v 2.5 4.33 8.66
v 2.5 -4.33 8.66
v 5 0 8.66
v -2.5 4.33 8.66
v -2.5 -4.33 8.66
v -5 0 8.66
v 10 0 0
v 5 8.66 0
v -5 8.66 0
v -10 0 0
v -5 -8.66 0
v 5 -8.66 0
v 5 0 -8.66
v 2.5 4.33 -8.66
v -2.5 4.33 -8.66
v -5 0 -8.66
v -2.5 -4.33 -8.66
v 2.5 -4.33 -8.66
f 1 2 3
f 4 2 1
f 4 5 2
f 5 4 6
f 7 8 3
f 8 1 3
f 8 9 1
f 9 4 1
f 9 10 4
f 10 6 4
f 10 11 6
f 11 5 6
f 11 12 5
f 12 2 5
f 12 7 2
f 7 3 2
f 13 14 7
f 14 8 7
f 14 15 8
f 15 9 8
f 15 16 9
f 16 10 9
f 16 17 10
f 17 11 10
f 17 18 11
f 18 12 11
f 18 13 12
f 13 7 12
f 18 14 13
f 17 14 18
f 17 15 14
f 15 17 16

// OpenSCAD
//Author: Chris Correll
//Date: 9/13/2022
//Description: Lesson 1-3 Smoothing curves with $fn, short lesson.
//reading: https://en.wikibooks.org/wiki/OpenSCAD_User_Manual/Other_Language_Features#.24fa.2C_.24fs_and_.24fn

$fn = 6; //resolution number of fragments in a 360 degree horizontal cross section number of sides of a sphere is (approx) given by = fn * floor((fn-1)/2)+2 
sphere(r=10);

//cylinder(r=10,h=10);

//can also include as an argument but lets just keep it at the top...
